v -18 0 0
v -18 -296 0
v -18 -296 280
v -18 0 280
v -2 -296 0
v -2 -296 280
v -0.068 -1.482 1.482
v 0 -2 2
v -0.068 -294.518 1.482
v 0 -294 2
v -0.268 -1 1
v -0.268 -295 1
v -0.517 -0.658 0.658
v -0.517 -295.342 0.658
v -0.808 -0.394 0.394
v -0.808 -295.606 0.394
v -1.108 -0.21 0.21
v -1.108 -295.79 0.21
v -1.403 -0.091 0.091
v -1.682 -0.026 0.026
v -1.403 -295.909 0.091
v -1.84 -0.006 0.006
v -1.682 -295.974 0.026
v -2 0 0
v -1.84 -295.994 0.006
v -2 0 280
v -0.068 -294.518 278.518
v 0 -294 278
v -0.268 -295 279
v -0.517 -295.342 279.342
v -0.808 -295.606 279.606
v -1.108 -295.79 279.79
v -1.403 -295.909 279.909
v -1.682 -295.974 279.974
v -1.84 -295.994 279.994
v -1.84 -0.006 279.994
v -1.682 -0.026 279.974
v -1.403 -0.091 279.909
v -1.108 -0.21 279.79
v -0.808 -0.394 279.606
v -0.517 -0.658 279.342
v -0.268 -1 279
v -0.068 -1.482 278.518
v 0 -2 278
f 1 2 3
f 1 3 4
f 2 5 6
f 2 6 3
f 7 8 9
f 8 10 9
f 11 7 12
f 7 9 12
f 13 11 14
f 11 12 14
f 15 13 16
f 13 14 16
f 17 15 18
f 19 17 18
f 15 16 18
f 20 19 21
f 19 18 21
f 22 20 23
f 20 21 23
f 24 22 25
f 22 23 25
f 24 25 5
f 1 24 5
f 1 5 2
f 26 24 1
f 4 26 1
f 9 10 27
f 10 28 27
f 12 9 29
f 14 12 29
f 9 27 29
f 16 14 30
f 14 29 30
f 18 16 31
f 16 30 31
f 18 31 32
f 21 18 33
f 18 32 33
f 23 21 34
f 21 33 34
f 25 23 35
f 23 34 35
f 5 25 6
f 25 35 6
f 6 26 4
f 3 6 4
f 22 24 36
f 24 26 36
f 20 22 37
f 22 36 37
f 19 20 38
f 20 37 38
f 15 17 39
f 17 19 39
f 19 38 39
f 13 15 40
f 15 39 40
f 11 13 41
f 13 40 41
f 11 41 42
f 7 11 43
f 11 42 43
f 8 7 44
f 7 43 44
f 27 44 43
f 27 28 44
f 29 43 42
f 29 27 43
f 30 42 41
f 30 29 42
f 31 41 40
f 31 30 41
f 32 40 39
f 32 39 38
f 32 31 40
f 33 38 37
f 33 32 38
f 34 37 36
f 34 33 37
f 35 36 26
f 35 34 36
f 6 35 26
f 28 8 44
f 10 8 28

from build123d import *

# Parameters (mm, degrees)
F0_W     = 42.5913929939
F0_H     = 36.7285981774
F1_DEPTH = 18
F2_DEPTH = 282
F3_DEPTH = 296
F4_DEPTH = 280
F5_R     = 2


with BuildPart() as f1:
    # F0 (on Right) → F1 (new body)
    with BuildSketch(Plane.YZ):
        with Locations((-21.295696497, 18.3642990887)):
            Rectangle(F0_W, F0_H)
    extrude(amount=-F1_DEPTH)

    # F2 (add): a face of the model
    f2_faces = [f1.faces().sort_by_distance(p)[0] for p in [
        (-9, -21.295696497, 0),
    ]]
    extrude(f2_faces, amount=-F2_DEPTH)

    # F3 (add): a face of the model
    f3_faces = [f1.faces().sort_by_distance(p)[0] for p in [
        (-9, 0, 141),
    ]]
    extrude(f3_faces, amount=-F3_DEPTH)

    # F4 (intersect): a face of the model
    f4_faces = [f1.faces().sort_by_distance(p)[0] for p in [
        (-9, -148, 0),
    ]]
    extrude(f4_faces, amount=-F4_DEPTH, mode=Mode.INTERSECT)

    # F5
    f5_edges = [f1.edges().sort_by_distance(p)[0] for p in [
        (0, -148, 0),
        (0, -296, 140),
        (0, -148, 280),
        (0, 0, 140),
    ]]
    fillet(f5_edges, radius=F5_R)


solid = f1.part
